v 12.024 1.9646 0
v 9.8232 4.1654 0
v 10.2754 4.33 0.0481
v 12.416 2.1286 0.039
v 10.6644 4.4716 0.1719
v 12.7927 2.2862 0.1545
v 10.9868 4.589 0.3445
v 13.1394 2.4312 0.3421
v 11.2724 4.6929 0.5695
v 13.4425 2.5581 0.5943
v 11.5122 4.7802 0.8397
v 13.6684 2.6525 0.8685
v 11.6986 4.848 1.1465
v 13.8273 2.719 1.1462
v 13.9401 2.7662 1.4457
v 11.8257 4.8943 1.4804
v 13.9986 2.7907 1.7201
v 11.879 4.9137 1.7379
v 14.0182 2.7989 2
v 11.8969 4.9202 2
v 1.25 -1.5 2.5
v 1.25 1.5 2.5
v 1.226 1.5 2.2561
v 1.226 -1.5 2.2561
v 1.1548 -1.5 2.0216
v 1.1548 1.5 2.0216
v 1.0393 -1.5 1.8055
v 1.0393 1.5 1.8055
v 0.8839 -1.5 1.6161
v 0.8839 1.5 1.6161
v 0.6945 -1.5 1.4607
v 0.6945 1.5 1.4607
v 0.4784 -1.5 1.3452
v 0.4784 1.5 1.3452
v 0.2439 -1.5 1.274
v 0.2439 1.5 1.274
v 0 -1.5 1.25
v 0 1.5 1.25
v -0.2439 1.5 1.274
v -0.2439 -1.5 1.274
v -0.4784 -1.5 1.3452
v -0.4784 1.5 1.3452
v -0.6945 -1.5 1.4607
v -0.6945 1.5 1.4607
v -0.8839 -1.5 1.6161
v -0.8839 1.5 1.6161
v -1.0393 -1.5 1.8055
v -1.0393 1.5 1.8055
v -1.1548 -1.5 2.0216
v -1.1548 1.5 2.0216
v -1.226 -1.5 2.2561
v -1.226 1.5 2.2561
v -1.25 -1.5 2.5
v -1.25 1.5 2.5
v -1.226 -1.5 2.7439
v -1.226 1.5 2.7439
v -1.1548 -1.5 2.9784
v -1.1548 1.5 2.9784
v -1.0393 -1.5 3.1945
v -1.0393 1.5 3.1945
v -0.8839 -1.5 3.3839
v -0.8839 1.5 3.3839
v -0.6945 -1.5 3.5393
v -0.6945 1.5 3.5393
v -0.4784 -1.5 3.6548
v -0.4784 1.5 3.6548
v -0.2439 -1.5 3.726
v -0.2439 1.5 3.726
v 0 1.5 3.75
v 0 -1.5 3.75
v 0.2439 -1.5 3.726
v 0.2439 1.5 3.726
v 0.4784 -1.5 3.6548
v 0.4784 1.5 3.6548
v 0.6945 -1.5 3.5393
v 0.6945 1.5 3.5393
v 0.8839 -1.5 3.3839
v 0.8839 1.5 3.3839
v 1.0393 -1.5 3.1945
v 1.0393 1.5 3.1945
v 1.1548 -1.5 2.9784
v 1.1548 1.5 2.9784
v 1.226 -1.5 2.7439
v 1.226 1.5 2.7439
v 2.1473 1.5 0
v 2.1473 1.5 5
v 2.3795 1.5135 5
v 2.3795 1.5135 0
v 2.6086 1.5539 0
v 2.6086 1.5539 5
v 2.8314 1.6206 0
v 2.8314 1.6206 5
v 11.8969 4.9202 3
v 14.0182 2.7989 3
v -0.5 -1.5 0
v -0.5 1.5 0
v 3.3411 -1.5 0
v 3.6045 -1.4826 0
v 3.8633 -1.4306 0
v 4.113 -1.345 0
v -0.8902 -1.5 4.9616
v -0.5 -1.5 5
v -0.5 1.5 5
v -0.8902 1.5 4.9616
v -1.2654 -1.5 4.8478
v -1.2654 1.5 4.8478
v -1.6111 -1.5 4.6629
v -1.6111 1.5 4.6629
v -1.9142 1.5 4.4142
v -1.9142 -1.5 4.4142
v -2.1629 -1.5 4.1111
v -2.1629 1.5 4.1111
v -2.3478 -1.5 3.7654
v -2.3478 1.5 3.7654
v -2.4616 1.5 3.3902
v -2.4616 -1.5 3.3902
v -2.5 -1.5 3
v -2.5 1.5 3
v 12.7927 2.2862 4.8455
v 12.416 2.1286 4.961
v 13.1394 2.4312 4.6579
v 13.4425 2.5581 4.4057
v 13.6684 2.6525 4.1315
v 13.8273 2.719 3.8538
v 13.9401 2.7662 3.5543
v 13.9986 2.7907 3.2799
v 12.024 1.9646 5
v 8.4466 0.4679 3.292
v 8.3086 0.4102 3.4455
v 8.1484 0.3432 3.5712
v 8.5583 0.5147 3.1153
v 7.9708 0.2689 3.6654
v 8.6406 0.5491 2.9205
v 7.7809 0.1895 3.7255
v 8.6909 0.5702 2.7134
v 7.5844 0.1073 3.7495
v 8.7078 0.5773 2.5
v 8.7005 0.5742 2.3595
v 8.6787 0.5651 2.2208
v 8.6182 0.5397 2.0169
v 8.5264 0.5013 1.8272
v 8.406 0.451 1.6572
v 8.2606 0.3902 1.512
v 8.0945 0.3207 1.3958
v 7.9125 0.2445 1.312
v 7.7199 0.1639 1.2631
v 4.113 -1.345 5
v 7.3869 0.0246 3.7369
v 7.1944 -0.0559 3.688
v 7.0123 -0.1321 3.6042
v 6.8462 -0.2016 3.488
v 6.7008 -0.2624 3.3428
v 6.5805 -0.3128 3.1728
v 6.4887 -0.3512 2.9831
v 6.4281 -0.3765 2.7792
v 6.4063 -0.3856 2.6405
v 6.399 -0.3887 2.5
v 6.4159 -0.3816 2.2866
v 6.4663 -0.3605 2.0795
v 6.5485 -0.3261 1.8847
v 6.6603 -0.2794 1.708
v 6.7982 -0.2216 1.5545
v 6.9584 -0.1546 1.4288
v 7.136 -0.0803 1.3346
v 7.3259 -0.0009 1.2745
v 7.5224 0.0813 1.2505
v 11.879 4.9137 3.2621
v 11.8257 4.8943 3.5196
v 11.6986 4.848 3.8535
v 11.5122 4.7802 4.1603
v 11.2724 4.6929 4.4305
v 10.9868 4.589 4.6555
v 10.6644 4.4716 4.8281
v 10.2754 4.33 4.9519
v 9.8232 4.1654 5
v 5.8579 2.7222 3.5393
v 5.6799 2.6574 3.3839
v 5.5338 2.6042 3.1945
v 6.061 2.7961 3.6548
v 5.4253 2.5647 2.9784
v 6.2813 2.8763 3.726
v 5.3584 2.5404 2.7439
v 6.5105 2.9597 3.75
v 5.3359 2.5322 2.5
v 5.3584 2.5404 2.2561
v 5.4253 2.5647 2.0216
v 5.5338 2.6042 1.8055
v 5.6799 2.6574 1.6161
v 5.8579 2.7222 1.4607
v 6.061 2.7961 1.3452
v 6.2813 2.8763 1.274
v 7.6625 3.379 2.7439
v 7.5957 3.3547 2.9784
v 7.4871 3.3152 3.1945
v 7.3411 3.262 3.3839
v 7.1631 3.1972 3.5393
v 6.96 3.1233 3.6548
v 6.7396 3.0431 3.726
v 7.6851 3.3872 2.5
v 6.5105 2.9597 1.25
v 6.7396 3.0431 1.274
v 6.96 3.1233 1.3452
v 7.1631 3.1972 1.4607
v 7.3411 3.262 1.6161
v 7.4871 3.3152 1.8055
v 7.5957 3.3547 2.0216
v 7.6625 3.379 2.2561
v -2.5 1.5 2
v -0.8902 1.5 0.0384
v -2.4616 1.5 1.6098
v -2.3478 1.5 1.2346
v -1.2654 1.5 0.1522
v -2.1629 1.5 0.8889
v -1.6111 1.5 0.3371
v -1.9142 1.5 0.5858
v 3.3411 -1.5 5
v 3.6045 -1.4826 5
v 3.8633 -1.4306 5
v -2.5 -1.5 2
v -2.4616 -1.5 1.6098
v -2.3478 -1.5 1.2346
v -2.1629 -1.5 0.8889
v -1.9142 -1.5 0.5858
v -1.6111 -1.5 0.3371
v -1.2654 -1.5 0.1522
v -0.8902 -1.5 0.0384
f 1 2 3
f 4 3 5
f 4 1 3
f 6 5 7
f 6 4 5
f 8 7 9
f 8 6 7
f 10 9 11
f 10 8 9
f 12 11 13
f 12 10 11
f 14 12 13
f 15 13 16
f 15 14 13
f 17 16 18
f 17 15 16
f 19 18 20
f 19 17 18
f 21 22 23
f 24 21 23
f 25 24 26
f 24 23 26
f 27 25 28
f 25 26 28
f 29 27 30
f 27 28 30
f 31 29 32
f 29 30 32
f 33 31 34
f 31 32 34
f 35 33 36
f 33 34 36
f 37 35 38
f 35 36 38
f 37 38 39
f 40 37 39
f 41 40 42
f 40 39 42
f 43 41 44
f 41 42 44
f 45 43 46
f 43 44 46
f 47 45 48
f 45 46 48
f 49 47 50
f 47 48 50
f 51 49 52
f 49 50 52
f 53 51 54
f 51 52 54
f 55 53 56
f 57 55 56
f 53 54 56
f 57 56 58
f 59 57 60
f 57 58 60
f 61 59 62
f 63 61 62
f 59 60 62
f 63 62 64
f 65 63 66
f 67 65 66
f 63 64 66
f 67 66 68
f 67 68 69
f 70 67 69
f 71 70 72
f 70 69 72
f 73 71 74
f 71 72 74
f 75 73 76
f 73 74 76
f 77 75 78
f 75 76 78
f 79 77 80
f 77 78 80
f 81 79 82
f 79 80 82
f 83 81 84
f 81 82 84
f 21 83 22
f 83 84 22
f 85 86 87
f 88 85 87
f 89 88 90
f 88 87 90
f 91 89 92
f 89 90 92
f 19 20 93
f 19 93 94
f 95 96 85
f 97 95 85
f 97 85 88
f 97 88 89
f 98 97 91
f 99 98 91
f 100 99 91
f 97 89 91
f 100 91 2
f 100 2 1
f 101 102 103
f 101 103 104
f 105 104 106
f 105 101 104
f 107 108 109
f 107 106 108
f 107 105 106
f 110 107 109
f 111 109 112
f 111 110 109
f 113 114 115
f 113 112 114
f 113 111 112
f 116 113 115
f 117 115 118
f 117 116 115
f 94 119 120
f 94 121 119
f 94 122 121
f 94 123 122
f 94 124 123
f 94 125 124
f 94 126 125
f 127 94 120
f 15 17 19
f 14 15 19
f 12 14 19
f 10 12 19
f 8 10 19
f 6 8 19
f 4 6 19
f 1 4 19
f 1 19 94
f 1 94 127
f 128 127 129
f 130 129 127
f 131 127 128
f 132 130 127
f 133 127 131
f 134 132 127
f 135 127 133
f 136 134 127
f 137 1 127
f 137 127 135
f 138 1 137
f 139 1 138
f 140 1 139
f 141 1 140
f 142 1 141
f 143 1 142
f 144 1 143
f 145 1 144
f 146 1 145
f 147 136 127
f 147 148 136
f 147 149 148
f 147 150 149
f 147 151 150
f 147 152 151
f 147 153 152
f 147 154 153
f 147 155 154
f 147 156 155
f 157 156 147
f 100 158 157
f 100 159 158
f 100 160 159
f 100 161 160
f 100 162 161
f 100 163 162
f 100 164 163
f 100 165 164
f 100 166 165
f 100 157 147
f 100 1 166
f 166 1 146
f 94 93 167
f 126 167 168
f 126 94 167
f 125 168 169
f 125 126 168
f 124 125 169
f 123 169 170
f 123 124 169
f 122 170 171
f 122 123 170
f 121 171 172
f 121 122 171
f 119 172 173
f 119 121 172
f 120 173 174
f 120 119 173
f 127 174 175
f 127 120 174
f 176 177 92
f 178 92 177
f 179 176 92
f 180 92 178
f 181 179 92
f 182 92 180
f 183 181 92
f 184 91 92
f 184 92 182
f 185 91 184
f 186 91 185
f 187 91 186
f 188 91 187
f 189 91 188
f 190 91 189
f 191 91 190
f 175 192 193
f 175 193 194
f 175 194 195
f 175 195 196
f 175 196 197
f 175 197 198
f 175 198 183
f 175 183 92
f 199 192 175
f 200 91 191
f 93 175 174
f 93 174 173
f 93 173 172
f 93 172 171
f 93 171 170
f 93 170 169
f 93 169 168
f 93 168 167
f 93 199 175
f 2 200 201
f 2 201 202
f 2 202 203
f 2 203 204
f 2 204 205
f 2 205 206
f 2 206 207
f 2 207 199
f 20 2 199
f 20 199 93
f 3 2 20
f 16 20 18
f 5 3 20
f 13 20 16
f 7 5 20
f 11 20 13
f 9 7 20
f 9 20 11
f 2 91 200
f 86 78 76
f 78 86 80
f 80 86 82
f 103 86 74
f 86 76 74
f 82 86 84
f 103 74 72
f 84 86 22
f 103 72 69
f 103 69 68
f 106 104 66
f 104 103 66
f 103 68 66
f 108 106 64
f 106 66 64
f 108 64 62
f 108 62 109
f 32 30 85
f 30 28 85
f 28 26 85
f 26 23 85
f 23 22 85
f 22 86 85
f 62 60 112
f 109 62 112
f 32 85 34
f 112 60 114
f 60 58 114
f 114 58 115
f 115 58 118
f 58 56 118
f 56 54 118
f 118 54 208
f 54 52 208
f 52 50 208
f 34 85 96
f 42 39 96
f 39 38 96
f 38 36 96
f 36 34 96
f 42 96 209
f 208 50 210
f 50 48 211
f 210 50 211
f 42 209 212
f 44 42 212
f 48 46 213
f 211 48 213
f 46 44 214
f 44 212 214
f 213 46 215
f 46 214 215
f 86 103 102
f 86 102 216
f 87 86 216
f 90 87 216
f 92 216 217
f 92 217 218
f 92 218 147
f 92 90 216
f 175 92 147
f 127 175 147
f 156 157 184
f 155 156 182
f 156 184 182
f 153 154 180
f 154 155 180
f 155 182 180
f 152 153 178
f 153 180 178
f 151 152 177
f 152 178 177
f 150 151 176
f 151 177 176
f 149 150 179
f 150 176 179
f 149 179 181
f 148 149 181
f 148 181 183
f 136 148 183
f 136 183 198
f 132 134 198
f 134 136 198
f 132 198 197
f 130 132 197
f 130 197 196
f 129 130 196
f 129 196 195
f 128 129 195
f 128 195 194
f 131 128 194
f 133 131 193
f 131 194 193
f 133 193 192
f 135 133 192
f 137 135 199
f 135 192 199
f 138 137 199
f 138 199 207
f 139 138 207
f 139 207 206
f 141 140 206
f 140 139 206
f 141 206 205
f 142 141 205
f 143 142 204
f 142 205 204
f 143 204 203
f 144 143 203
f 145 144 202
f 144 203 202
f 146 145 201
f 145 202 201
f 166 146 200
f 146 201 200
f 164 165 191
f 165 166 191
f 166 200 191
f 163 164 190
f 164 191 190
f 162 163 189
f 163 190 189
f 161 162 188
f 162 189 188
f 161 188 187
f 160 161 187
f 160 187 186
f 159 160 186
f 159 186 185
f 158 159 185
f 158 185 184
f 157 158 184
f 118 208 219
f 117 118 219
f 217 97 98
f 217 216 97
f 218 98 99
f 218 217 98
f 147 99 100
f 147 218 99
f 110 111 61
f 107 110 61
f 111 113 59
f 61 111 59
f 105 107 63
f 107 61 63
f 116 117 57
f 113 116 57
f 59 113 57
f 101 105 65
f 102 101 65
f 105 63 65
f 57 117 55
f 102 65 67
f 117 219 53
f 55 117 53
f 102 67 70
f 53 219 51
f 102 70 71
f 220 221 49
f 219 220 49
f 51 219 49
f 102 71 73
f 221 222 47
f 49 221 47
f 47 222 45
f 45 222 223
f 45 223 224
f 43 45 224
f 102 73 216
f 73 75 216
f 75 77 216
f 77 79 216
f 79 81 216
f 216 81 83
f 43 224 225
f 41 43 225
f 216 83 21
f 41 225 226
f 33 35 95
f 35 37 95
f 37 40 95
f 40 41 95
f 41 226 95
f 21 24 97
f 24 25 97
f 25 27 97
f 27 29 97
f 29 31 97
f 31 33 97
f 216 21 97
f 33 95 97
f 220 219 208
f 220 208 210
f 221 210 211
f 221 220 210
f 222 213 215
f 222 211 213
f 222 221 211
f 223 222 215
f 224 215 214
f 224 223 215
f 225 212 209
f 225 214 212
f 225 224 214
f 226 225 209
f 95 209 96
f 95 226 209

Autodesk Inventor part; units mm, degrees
ref_plane "YZ Plane" through (0, 0, 0) normal (1, 0, 0) x (0, 1, 0)
ref_plane "XZ Plane" through (0, 0, 0) normal (0, 1, 0) x (-1, 0, 0)
ref_plane "XY Plane" through (0, 0, 0) normal (0, 0, 1) x (1, 0, 0)
sketch "Sketch1" plane through (0, 0, 0) normal (0, 0, 1) x (1, 0, 0)
  line L0 (-2.5, -1.5) -> (2.5, -1.5)
  line L1 (2.5, -1.5) -> (2.5, 1.5)
  line L2 (2.5, 1.5) -> (-2.5, 1.5)
  line L3 (-2.5, 1.5) -> (-2.5, -1.5)
  line L4 (-2.5, -1.5) -> (2.5, 1.5) construction
  line L5 (2.5, -1.5) -> (-2.5, 1.5) construction
  line L6 (2.5, 1.5) -> (11.8969, 4.9202)
  line L7 (2.5, 1.5) -> (12.5, 1.5) construction
  line L8 (11.8969, 4.9202) -> (14.0182, 2.7989)
  line L9 (14.0182, 2.7989) -> (3.7426, -1.5)
  line L10 (3.7426, -1.5) -> (2.5, -1.5)
  point P0 (0, 0)
  dimension "d0" = 5
  dimension "d1" = 3
  dimension "d2" = 10
  dimension "d3" = 20
  dimension "d4" = 3
extrude "Extrusion1" add sketch "Sketch1" along normal blind 5
sketch "Sketch2" plane through (-2.5, 1.5, 0) normal (0, 1, 0) x (1, 0, 0)
  line L0 (2.5, 0) -> (2.5, -5)
  line L1 (0, -5) -> (6.2426, -5) projected
  circle A0 centre (2.5, -2.5) radius 1.25
  dimension "d7" = 2.5
extrude "Extrusion2" cut sketch "Sketch2" against normal blind 5
fillet "Fillet1" radius 2 2 edges at (2.5, 1.5, 2.5) (3.7426, -1.5, 2.5)
sketch "Sketch3" plane through (11.8969, 4.9202, 0) normal (-0.342, 0.9397, 0) x (-0.9397, -0.342, 0)
  line L0 (-1.2679, 0) -> (-1.2679, 5) projected
  line L1 (-1.2679, 2.5) -> (5.7321, 2.5)
  circle A0 centre (5.7321, 2.5) radius 1.25
  point P0 (12.8623, 0)
  dimension "d11" = 7
  dimension "d12" = 2.5
extrude "Extrusion3" cut sketch "Sketch3" against normal up to next
fillet "Fillet2" radius 2 4 edges at (12.9576, 3.8595, 5) (12.9576, 3.8595, 0) (-2.5, 0, 5) (-2.5, 0, 0)
properties part number "rpi_mount"
